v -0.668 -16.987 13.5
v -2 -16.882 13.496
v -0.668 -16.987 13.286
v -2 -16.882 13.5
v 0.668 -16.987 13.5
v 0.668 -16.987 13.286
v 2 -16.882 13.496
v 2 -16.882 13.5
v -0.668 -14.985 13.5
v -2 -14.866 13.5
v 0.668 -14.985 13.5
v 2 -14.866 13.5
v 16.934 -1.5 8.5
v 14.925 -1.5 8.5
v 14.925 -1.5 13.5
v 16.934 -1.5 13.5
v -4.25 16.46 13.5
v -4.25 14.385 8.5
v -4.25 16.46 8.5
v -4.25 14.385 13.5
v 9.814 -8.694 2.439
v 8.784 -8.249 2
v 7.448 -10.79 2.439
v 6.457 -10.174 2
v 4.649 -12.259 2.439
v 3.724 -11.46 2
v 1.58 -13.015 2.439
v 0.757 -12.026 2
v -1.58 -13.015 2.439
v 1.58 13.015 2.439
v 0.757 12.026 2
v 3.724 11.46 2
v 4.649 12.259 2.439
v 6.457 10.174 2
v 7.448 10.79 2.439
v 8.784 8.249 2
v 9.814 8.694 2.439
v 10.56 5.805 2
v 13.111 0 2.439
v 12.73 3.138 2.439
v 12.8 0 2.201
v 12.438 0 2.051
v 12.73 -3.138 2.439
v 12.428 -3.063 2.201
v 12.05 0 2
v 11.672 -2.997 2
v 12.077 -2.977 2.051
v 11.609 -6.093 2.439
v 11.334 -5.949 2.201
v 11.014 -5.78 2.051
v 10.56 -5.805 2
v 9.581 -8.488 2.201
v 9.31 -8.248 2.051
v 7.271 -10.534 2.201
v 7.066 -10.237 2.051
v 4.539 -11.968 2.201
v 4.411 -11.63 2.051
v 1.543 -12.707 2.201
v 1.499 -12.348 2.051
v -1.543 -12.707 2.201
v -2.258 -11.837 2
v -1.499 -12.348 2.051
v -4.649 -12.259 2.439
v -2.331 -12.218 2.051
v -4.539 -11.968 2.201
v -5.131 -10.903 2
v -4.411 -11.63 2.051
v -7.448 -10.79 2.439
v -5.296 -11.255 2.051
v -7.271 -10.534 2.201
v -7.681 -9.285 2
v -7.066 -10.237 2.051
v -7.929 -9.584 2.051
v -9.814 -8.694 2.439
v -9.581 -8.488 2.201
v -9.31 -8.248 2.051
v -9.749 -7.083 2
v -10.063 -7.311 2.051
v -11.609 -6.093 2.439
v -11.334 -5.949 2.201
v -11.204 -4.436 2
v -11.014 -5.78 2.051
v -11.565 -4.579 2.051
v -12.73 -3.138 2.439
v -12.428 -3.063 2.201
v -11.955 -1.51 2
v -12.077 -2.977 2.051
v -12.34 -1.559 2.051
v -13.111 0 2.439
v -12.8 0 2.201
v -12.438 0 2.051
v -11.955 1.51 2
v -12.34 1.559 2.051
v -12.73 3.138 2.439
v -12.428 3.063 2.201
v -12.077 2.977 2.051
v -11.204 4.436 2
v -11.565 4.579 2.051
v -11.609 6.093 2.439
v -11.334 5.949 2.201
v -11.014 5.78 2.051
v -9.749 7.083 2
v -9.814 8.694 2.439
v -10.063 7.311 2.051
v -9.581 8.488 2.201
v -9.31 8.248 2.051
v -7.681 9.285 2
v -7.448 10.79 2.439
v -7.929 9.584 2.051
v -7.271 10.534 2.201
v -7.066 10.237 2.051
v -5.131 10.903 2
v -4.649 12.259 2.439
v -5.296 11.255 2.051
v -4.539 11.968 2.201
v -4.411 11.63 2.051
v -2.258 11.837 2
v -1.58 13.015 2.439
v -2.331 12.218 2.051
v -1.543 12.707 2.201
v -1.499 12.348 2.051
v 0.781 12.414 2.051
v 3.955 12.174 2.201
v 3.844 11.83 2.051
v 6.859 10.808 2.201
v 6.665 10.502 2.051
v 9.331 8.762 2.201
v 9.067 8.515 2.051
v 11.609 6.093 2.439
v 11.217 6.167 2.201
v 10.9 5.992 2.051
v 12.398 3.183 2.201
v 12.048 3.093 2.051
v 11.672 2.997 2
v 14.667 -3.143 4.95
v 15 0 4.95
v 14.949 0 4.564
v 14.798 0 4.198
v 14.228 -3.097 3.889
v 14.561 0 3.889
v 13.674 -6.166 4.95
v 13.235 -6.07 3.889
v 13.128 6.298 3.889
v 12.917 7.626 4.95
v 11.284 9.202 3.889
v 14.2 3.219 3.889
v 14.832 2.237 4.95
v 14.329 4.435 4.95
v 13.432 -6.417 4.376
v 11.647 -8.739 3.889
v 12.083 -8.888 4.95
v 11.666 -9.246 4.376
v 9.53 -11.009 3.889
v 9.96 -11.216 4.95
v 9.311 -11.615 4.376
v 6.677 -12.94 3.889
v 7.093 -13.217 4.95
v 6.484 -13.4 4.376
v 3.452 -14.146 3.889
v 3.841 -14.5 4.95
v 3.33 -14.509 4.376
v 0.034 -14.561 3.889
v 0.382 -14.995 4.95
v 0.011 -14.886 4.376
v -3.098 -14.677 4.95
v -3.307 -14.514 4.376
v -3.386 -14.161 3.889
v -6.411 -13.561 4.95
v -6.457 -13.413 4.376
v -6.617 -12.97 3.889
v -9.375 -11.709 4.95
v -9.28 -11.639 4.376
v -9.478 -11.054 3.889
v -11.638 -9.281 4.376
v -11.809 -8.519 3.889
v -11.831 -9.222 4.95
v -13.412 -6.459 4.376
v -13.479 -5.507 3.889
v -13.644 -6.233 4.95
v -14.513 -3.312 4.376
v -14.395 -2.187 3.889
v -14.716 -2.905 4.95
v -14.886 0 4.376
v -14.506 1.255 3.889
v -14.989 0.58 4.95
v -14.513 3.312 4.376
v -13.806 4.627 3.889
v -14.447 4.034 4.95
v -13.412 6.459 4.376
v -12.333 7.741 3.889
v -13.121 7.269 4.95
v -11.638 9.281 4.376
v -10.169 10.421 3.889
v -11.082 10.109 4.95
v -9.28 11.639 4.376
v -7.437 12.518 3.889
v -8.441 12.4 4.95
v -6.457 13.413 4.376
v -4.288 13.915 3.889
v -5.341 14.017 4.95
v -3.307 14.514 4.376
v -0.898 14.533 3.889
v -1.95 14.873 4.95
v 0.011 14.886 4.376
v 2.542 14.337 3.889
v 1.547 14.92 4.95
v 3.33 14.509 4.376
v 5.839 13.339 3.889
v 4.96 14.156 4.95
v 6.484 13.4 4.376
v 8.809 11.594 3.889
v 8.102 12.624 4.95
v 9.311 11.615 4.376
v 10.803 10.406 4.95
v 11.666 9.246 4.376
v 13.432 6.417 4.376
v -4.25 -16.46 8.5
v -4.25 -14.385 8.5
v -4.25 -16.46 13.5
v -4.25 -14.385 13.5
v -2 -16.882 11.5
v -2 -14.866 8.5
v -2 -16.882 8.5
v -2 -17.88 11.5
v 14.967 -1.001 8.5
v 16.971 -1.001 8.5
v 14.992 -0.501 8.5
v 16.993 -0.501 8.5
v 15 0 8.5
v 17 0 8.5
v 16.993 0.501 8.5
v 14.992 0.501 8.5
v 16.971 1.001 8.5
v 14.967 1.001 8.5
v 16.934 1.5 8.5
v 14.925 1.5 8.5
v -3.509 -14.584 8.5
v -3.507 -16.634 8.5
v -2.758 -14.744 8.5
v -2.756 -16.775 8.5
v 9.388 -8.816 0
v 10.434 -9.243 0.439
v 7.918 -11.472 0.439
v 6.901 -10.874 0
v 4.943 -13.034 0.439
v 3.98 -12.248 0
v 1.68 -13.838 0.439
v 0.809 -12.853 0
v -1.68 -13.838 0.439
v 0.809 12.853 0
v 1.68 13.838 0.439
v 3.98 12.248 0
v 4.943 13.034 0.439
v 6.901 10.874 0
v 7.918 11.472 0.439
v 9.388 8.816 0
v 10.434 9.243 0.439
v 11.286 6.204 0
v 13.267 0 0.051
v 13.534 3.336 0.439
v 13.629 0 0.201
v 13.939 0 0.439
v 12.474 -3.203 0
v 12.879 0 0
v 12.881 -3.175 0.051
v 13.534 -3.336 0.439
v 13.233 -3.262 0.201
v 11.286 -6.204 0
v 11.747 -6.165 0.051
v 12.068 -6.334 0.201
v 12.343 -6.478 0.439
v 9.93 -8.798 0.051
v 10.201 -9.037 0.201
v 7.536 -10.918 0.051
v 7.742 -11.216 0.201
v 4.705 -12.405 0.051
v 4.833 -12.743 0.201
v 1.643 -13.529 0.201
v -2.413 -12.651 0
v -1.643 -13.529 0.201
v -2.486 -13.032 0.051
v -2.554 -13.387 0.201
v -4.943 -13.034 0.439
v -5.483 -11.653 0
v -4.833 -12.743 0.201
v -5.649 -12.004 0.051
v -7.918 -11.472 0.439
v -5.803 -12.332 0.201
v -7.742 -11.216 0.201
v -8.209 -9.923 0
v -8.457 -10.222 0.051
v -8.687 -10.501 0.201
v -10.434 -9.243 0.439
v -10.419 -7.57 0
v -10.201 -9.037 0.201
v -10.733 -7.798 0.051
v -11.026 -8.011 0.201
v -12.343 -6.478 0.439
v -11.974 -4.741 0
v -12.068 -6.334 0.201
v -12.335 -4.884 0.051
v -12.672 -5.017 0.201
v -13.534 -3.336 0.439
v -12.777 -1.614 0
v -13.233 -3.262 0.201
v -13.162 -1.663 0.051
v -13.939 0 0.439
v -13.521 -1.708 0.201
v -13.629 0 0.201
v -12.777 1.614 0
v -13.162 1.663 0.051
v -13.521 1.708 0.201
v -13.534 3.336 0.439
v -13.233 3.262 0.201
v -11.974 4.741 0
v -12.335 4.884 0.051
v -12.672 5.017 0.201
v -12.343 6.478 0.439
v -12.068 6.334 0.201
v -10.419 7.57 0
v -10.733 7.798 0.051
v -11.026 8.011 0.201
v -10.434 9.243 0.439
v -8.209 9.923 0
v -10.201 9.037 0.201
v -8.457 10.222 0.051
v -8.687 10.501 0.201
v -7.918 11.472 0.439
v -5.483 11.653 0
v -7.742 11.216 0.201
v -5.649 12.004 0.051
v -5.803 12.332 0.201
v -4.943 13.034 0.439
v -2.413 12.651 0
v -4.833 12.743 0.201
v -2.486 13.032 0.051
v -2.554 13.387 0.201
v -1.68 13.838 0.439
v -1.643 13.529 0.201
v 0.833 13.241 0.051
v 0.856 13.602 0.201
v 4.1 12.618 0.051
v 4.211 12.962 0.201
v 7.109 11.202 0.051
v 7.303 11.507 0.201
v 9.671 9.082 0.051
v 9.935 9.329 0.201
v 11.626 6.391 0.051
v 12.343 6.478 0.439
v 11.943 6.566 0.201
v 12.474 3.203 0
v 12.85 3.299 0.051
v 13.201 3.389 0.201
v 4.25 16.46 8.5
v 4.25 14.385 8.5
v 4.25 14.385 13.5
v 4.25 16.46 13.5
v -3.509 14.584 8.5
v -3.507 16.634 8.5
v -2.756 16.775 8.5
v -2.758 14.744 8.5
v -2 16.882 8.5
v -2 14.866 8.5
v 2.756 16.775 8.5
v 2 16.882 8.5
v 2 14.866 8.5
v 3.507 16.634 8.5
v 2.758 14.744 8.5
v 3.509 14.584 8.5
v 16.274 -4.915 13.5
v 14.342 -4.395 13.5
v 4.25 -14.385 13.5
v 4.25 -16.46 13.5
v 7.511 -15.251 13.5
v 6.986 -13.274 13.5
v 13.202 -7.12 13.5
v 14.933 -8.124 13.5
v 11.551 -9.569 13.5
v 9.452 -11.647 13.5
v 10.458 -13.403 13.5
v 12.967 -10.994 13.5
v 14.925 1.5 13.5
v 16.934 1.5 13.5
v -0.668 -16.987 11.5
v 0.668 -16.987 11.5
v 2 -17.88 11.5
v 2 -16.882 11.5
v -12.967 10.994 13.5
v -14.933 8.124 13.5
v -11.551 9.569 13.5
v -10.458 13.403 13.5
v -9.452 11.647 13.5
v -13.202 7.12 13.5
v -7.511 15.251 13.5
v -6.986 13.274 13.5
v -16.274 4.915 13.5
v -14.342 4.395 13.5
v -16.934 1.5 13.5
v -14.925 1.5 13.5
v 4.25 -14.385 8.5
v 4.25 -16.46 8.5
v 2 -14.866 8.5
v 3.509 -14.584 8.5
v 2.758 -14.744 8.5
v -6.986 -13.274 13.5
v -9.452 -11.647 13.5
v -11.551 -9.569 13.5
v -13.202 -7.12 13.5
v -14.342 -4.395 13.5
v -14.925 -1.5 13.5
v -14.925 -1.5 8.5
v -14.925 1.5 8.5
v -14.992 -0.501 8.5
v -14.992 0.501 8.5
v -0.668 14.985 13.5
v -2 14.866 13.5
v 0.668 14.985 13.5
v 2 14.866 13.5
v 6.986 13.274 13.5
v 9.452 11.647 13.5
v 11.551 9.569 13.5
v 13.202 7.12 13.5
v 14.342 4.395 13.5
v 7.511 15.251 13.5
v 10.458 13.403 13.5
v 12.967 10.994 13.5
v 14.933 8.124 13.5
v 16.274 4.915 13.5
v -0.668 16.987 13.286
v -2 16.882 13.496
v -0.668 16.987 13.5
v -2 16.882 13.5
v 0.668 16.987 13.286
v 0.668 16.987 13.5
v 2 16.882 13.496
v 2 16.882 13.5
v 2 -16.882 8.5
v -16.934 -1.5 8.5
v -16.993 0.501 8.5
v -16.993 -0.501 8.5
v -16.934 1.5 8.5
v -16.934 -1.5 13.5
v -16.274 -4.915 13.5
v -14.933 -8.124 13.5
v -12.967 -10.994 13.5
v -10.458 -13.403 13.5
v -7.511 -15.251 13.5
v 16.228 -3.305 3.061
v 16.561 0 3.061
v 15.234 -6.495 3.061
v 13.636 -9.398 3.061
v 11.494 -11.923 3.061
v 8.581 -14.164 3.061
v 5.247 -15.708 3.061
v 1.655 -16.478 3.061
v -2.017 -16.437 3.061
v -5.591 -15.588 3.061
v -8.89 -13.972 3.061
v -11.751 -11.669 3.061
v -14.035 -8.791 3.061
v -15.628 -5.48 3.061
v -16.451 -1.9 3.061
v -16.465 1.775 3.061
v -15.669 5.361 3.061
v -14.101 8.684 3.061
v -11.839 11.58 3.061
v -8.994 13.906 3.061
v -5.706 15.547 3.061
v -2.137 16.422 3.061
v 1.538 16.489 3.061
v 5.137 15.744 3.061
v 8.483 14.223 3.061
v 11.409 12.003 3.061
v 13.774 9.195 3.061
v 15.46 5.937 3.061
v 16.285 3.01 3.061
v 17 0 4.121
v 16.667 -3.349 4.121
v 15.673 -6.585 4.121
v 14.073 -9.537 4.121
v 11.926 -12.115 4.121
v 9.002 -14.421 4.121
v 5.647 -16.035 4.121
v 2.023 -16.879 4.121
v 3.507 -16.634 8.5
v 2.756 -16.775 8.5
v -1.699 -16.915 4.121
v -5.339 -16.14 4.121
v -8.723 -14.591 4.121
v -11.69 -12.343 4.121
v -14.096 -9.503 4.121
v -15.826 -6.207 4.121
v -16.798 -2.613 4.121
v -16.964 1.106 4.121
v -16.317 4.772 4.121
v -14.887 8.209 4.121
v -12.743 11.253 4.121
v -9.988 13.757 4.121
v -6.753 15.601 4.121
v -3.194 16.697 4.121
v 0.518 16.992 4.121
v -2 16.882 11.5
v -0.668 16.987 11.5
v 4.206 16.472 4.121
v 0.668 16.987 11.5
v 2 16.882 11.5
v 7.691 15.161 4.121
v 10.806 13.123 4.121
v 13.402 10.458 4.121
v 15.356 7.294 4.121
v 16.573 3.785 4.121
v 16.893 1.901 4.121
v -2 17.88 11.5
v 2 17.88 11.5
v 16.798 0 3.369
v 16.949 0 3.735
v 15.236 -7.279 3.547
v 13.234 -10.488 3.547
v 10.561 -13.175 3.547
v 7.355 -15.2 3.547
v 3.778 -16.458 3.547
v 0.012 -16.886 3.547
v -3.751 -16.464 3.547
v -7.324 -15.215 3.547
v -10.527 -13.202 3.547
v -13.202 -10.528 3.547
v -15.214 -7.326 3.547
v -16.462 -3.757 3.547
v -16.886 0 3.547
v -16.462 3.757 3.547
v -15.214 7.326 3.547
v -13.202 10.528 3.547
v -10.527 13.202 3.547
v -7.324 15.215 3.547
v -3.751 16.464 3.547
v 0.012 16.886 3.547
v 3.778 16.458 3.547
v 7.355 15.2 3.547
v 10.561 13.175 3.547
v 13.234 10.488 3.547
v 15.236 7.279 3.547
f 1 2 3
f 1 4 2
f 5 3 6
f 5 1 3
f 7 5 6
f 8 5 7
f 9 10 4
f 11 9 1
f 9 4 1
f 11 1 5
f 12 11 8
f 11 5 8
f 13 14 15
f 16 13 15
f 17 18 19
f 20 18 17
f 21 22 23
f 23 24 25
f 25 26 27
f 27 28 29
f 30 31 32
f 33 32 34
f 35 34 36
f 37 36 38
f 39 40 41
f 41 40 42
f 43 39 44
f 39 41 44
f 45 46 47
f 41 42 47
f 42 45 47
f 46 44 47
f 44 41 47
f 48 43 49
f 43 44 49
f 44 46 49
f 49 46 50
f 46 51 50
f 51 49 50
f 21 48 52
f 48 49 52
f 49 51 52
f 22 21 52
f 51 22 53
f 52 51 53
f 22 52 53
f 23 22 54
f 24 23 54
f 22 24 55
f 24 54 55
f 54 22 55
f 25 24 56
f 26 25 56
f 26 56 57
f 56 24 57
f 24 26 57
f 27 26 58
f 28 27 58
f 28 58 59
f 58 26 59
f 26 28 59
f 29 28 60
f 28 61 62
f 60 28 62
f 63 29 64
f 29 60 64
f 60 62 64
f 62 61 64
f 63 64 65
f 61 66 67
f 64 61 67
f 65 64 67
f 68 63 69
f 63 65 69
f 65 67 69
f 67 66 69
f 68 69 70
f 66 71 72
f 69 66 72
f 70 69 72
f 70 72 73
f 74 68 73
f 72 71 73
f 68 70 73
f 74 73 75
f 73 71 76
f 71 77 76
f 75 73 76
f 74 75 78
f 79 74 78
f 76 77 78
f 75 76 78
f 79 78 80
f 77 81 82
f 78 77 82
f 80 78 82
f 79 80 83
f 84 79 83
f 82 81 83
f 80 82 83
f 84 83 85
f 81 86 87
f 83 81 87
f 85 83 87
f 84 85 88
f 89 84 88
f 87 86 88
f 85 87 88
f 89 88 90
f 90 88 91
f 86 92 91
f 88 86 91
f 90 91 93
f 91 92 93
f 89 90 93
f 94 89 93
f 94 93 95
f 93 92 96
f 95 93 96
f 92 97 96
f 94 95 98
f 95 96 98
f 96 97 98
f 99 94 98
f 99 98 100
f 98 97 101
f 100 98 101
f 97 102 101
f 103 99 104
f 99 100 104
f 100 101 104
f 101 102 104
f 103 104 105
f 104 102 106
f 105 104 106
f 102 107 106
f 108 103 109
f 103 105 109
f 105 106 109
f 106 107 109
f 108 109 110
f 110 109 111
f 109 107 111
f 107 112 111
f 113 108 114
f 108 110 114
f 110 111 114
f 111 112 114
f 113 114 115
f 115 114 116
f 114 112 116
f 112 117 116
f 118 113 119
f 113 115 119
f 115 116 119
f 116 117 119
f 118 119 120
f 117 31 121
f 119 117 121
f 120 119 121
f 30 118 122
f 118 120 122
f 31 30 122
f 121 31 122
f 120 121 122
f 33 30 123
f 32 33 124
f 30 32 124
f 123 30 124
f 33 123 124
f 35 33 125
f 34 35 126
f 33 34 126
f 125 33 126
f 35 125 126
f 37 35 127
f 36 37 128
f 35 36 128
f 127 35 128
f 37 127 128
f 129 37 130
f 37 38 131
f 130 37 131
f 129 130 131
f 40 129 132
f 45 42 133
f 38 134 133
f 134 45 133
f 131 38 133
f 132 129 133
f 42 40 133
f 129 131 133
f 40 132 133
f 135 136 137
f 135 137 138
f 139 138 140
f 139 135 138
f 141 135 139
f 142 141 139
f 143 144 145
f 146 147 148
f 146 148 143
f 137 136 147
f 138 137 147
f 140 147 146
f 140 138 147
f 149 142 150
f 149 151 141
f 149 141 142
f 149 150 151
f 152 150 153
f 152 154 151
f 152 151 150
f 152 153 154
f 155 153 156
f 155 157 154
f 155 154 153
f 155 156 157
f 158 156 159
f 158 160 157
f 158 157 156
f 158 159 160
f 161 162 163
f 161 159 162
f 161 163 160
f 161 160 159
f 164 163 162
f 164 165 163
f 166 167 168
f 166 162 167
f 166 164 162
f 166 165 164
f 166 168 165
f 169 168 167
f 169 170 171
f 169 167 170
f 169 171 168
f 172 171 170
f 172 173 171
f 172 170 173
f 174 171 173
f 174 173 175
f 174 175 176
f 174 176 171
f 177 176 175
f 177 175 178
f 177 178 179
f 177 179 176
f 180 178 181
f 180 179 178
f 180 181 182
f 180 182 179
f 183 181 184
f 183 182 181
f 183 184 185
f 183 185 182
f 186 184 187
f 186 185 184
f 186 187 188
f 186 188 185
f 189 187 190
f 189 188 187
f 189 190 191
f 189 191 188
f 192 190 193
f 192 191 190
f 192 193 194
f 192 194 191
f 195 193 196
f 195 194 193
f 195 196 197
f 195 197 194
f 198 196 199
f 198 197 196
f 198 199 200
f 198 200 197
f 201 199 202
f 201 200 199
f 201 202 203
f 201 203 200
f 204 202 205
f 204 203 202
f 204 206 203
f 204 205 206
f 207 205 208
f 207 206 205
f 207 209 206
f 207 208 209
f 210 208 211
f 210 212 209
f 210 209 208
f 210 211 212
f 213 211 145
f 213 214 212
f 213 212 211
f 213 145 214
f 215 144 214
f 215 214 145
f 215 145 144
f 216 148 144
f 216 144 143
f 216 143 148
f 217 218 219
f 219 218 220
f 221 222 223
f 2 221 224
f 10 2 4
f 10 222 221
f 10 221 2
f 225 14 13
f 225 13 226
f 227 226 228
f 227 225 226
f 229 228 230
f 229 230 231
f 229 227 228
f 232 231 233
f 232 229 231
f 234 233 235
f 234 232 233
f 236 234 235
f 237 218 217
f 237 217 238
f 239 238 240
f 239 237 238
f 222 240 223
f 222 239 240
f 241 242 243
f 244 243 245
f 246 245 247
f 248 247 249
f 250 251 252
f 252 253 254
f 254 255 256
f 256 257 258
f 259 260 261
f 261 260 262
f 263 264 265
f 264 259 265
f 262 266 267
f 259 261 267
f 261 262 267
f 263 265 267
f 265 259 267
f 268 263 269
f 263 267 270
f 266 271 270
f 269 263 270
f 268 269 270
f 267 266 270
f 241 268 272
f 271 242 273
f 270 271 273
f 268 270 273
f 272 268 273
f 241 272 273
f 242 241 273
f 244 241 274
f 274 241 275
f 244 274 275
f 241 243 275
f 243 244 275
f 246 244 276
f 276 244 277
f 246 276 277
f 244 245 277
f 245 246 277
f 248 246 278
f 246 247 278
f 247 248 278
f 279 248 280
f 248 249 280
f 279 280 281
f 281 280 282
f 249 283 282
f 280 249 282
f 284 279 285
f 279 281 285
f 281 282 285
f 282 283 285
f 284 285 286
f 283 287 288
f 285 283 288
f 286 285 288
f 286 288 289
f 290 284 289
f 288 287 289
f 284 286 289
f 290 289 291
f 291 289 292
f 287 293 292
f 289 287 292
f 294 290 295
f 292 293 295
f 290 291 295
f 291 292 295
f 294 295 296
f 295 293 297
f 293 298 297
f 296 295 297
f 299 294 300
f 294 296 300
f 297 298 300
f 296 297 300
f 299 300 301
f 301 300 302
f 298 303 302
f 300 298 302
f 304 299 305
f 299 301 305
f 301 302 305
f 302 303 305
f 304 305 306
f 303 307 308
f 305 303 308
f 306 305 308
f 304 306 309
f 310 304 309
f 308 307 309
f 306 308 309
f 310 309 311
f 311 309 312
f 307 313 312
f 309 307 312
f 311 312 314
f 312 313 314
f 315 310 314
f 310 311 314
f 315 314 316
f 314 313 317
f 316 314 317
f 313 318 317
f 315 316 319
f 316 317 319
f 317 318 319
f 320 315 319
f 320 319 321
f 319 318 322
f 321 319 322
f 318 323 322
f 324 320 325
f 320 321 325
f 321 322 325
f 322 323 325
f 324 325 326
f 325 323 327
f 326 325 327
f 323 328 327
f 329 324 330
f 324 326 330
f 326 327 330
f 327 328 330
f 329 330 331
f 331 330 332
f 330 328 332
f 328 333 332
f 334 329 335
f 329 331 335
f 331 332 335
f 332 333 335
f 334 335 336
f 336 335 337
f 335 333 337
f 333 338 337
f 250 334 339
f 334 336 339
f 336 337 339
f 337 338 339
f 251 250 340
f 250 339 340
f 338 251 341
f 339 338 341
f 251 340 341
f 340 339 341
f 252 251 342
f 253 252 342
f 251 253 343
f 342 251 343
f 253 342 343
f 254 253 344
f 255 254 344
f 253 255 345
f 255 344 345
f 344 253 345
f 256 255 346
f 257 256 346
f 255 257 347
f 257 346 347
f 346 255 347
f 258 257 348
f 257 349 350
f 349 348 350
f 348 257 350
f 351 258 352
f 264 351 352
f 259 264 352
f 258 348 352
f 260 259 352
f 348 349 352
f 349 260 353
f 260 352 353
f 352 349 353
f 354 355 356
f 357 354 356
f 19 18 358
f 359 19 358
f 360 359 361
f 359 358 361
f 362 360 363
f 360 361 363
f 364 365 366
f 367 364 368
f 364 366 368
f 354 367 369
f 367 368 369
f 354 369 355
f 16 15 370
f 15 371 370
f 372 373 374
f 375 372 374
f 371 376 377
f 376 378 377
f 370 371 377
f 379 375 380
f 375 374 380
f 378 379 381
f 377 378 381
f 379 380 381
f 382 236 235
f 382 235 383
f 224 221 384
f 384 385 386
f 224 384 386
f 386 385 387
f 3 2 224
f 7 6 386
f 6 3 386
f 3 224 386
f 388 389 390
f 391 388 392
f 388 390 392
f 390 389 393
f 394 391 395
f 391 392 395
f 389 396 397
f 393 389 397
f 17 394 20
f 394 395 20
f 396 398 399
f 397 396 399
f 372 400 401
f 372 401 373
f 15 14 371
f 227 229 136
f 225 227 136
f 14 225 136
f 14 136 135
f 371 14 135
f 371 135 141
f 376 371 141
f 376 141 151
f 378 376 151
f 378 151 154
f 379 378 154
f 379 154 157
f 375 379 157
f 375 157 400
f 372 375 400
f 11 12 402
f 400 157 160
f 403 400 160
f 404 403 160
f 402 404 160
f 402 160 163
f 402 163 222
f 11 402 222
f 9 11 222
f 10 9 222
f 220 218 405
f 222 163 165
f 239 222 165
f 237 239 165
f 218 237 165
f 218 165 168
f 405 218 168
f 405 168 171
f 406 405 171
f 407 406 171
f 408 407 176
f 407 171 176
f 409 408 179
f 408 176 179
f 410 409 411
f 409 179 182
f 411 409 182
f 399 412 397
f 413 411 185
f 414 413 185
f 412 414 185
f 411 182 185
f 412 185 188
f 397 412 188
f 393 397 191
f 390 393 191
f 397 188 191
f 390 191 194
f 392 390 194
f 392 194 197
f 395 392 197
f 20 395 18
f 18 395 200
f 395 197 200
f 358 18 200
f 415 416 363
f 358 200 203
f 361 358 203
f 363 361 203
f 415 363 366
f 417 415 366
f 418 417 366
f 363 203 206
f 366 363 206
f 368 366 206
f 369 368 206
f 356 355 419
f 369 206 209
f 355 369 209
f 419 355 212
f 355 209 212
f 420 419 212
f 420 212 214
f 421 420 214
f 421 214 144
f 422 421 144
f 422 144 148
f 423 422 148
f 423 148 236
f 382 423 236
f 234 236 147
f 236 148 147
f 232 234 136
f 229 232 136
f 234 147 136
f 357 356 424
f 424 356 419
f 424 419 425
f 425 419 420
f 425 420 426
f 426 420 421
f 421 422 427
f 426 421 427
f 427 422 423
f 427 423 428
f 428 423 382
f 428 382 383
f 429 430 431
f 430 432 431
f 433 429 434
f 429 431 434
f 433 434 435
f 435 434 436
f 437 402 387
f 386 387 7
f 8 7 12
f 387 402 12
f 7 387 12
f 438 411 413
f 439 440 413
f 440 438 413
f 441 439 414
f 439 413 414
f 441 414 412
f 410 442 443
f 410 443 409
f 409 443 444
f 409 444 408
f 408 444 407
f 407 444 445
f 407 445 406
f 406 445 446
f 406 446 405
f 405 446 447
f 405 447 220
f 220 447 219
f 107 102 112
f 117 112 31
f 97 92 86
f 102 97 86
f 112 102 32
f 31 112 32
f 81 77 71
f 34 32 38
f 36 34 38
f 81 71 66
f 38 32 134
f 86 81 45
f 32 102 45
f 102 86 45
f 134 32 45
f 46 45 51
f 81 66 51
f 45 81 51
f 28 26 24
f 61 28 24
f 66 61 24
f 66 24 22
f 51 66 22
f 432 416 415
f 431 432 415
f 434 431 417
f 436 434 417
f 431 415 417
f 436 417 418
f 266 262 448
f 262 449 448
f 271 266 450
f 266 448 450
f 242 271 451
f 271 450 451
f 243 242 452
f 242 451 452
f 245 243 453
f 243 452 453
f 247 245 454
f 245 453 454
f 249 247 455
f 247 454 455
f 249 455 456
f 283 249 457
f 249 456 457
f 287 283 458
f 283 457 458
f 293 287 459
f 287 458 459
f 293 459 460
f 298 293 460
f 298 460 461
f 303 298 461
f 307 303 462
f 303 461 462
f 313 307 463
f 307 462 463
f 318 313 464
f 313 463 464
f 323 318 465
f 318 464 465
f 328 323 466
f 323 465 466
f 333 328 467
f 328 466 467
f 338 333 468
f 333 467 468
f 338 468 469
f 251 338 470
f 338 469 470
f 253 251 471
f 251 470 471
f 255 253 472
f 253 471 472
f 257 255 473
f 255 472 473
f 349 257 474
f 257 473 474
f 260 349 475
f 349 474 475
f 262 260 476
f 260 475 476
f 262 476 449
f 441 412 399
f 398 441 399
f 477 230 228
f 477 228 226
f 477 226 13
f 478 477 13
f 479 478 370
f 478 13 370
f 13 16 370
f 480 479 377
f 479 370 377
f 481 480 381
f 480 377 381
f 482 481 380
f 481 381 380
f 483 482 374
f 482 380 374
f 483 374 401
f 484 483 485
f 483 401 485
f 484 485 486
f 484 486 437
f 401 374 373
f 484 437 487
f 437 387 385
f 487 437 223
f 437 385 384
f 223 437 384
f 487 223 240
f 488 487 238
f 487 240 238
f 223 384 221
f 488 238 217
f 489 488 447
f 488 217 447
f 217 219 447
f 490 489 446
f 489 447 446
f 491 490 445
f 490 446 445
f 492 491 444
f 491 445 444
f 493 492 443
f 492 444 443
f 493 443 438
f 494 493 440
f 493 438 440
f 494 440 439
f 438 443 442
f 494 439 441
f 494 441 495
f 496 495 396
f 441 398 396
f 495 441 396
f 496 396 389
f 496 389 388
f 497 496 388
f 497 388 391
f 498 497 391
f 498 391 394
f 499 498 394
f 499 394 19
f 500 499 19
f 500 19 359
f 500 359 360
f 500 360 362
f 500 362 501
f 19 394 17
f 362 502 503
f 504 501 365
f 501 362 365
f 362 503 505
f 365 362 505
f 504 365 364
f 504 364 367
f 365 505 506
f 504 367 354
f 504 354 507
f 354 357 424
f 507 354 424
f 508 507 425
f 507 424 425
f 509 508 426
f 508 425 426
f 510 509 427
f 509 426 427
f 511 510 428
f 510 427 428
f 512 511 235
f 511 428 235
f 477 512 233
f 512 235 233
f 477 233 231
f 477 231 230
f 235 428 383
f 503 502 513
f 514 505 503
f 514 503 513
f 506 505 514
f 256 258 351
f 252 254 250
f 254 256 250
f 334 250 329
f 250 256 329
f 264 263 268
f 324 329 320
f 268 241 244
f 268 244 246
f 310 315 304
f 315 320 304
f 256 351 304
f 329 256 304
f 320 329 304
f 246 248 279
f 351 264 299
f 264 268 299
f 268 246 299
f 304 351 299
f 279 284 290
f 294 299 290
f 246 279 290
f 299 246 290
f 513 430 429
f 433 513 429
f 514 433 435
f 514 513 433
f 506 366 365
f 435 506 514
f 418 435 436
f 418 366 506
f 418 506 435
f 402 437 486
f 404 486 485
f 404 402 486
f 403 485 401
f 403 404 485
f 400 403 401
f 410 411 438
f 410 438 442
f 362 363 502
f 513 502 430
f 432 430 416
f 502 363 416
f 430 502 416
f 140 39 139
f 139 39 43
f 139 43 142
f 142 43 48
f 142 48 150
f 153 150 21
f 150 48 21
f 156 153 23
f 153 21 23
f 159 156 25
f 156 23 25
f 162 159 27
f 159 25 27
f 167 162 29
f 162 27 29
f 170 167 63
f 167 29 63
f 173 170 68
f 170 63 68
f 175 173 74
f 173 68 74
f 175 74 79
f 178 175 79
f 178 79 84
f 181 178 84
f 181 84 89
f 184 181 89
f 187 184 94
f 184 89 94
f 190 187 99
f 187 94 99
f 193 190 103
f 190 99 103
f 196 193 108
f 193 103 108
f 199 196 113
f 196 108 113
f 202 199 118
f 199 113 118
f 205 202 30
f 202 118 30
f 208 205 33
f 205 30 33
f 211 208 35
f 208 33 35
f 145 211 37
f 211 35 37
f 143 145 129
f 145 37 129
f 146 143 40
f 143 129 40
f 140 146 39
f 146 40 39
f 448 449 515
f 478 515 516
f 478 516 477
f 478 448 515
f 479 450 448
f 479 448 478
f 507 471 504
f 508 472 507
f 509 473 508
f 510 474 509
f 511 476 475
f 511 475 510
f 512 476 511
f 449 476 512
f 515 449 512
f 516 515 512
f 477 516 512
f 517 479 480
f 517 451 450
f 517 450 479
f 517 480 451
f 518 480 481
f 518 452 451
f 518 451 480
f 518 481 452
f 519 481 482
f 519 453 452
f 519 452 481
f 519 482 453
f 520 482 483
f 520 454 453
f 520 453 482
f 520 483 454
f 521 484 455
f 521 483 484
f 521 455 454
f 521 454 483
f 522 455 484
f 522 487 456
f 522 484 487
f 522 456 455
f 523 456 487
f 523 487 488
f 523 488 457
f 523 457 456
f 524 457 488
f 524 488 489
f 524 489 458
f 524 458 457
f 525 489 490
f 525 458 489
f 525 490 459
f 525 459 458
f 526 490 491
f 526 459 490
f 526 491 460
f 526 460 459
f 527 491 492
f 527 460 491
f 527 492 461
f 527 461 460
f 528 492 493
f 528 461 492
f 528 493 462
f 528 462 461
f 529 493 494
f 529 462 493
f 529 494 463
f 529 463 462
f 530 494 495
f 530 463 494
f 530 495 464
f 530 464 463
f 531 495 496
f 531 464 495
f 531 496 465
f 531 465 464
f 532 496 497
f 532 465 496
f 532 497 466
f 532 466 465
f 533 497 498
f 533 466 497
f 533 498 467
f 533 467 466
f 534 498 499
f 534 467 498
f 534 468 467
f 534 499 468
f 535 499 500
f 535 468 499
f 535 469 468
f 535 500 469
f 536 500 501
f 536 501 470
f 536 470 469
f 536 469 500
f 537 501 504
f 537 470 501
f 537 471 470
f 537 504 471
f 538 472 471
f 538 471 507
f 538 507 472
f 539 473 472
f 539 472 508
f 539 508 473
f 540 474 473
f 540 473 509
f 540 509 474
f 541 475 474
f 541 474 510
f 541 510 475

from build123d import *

# Parameters (mm, degrees)
F2_W          = 3
F2_H          = 6.5
F3_DEPTH      = 25
F3_DEPTH_BACK = 25
F4_W          = 2.25
F4_H          = 6.5
F5_DEPTH      = 25
F5_DEPTH_BACK = 25
F6_R          = 1.5
F8_W          = 4
F8_H          = 2
F9_DEPTH      = 1
F10_SIZE2     = 1.99999
F10_SIZE      = 0.99999


# Not quite as in the source:
# - a fillet or chamfer is up to 0.001 mm smaller than in the source, because OpenCascade refuses the exact size


with BuildPart() as f1:
    # F0 (on Front) → F1 (revolve)
    with BuildSketch(Plane.XZ):
        Polygon((0, 2), (0, 0), (13.5, 0), (17, 3.5), (17, 13.5), (15, 13.5), (15, 4.3284271247), (12.6715728753, 2), align=None)
    revolve(axis=Axis((0, 0, 1), (0, 0, -1)))

    # F2 (on Right) → F3 (cut, two sides)
    with BuildSketch(Plane.YZ) as f3_sk:
        with Locations((0, 11.75)):
            Rectangle(F2_W, F2_H)
    extrude(amount=F3_DEPTH, mode=Mode.SUBTRACT)
    extrude(f3_sk.sketch, amount=-F3_DEPTH_BACK, mode=Mode.SUBTRACT)

    # F4 (on Front) → F5 (cut, two sides)
    with BuildSketch(Plane.XZ) as f5_sk:
        with Locations((-3.125, 11.75)):
            Rectangle(F4_W, F4_H)
        with Locations((3.125, 11.75)):
            Rectangle(F4_W, F4_H)
    extrude(amount=F5_DEPTH, mode=Mode.SUBTRACT)
    extrude(f5_sk.sketch, amount=-F5_DEPTH_BACK, mode=Mode.SUBTRACT)

    # F6
    f6_edges = [f1.edges().sort_by_distance(p)[0] for p in [
        (-12.671573, 0, 2),
        (-15, 0, 4.328427),
        (-17, 0, 3.5),
        (-13.5, 0, 0),
    ]]
    fillet(f6_edges, radius=F6_R)

    # F8 (on offset) → F9 (join)
    with BuildSketch(Plane.XZ.offset(16.88)):
        with Locations((0, 12.5)):
            Rectangle(F8_W, F8_H)
    extrude(amount=F9_DEPTH)

    # F10 (size 1 and 2 in the source; OpenCascade refuses exactly that, so slightly less here)
    f10_edges = [f1.edges().sort_by_distance(p)[0] for p in [
        (0, -17.88, 13.5),
    ]]
    f10_side = f1.faces().sort_by_distance((0, -16.417446, 13.5))[0]
    chamfer(f10_edges, length=F10_SIZE, length2=F10_SIZE2, reference=f10_side)

    # F11: F1 across plane


with BuildPart() as f1_1:
    add(f1.part)
    add(f1.part.mirror(Plane.XZ))


solid = f1_1.part
